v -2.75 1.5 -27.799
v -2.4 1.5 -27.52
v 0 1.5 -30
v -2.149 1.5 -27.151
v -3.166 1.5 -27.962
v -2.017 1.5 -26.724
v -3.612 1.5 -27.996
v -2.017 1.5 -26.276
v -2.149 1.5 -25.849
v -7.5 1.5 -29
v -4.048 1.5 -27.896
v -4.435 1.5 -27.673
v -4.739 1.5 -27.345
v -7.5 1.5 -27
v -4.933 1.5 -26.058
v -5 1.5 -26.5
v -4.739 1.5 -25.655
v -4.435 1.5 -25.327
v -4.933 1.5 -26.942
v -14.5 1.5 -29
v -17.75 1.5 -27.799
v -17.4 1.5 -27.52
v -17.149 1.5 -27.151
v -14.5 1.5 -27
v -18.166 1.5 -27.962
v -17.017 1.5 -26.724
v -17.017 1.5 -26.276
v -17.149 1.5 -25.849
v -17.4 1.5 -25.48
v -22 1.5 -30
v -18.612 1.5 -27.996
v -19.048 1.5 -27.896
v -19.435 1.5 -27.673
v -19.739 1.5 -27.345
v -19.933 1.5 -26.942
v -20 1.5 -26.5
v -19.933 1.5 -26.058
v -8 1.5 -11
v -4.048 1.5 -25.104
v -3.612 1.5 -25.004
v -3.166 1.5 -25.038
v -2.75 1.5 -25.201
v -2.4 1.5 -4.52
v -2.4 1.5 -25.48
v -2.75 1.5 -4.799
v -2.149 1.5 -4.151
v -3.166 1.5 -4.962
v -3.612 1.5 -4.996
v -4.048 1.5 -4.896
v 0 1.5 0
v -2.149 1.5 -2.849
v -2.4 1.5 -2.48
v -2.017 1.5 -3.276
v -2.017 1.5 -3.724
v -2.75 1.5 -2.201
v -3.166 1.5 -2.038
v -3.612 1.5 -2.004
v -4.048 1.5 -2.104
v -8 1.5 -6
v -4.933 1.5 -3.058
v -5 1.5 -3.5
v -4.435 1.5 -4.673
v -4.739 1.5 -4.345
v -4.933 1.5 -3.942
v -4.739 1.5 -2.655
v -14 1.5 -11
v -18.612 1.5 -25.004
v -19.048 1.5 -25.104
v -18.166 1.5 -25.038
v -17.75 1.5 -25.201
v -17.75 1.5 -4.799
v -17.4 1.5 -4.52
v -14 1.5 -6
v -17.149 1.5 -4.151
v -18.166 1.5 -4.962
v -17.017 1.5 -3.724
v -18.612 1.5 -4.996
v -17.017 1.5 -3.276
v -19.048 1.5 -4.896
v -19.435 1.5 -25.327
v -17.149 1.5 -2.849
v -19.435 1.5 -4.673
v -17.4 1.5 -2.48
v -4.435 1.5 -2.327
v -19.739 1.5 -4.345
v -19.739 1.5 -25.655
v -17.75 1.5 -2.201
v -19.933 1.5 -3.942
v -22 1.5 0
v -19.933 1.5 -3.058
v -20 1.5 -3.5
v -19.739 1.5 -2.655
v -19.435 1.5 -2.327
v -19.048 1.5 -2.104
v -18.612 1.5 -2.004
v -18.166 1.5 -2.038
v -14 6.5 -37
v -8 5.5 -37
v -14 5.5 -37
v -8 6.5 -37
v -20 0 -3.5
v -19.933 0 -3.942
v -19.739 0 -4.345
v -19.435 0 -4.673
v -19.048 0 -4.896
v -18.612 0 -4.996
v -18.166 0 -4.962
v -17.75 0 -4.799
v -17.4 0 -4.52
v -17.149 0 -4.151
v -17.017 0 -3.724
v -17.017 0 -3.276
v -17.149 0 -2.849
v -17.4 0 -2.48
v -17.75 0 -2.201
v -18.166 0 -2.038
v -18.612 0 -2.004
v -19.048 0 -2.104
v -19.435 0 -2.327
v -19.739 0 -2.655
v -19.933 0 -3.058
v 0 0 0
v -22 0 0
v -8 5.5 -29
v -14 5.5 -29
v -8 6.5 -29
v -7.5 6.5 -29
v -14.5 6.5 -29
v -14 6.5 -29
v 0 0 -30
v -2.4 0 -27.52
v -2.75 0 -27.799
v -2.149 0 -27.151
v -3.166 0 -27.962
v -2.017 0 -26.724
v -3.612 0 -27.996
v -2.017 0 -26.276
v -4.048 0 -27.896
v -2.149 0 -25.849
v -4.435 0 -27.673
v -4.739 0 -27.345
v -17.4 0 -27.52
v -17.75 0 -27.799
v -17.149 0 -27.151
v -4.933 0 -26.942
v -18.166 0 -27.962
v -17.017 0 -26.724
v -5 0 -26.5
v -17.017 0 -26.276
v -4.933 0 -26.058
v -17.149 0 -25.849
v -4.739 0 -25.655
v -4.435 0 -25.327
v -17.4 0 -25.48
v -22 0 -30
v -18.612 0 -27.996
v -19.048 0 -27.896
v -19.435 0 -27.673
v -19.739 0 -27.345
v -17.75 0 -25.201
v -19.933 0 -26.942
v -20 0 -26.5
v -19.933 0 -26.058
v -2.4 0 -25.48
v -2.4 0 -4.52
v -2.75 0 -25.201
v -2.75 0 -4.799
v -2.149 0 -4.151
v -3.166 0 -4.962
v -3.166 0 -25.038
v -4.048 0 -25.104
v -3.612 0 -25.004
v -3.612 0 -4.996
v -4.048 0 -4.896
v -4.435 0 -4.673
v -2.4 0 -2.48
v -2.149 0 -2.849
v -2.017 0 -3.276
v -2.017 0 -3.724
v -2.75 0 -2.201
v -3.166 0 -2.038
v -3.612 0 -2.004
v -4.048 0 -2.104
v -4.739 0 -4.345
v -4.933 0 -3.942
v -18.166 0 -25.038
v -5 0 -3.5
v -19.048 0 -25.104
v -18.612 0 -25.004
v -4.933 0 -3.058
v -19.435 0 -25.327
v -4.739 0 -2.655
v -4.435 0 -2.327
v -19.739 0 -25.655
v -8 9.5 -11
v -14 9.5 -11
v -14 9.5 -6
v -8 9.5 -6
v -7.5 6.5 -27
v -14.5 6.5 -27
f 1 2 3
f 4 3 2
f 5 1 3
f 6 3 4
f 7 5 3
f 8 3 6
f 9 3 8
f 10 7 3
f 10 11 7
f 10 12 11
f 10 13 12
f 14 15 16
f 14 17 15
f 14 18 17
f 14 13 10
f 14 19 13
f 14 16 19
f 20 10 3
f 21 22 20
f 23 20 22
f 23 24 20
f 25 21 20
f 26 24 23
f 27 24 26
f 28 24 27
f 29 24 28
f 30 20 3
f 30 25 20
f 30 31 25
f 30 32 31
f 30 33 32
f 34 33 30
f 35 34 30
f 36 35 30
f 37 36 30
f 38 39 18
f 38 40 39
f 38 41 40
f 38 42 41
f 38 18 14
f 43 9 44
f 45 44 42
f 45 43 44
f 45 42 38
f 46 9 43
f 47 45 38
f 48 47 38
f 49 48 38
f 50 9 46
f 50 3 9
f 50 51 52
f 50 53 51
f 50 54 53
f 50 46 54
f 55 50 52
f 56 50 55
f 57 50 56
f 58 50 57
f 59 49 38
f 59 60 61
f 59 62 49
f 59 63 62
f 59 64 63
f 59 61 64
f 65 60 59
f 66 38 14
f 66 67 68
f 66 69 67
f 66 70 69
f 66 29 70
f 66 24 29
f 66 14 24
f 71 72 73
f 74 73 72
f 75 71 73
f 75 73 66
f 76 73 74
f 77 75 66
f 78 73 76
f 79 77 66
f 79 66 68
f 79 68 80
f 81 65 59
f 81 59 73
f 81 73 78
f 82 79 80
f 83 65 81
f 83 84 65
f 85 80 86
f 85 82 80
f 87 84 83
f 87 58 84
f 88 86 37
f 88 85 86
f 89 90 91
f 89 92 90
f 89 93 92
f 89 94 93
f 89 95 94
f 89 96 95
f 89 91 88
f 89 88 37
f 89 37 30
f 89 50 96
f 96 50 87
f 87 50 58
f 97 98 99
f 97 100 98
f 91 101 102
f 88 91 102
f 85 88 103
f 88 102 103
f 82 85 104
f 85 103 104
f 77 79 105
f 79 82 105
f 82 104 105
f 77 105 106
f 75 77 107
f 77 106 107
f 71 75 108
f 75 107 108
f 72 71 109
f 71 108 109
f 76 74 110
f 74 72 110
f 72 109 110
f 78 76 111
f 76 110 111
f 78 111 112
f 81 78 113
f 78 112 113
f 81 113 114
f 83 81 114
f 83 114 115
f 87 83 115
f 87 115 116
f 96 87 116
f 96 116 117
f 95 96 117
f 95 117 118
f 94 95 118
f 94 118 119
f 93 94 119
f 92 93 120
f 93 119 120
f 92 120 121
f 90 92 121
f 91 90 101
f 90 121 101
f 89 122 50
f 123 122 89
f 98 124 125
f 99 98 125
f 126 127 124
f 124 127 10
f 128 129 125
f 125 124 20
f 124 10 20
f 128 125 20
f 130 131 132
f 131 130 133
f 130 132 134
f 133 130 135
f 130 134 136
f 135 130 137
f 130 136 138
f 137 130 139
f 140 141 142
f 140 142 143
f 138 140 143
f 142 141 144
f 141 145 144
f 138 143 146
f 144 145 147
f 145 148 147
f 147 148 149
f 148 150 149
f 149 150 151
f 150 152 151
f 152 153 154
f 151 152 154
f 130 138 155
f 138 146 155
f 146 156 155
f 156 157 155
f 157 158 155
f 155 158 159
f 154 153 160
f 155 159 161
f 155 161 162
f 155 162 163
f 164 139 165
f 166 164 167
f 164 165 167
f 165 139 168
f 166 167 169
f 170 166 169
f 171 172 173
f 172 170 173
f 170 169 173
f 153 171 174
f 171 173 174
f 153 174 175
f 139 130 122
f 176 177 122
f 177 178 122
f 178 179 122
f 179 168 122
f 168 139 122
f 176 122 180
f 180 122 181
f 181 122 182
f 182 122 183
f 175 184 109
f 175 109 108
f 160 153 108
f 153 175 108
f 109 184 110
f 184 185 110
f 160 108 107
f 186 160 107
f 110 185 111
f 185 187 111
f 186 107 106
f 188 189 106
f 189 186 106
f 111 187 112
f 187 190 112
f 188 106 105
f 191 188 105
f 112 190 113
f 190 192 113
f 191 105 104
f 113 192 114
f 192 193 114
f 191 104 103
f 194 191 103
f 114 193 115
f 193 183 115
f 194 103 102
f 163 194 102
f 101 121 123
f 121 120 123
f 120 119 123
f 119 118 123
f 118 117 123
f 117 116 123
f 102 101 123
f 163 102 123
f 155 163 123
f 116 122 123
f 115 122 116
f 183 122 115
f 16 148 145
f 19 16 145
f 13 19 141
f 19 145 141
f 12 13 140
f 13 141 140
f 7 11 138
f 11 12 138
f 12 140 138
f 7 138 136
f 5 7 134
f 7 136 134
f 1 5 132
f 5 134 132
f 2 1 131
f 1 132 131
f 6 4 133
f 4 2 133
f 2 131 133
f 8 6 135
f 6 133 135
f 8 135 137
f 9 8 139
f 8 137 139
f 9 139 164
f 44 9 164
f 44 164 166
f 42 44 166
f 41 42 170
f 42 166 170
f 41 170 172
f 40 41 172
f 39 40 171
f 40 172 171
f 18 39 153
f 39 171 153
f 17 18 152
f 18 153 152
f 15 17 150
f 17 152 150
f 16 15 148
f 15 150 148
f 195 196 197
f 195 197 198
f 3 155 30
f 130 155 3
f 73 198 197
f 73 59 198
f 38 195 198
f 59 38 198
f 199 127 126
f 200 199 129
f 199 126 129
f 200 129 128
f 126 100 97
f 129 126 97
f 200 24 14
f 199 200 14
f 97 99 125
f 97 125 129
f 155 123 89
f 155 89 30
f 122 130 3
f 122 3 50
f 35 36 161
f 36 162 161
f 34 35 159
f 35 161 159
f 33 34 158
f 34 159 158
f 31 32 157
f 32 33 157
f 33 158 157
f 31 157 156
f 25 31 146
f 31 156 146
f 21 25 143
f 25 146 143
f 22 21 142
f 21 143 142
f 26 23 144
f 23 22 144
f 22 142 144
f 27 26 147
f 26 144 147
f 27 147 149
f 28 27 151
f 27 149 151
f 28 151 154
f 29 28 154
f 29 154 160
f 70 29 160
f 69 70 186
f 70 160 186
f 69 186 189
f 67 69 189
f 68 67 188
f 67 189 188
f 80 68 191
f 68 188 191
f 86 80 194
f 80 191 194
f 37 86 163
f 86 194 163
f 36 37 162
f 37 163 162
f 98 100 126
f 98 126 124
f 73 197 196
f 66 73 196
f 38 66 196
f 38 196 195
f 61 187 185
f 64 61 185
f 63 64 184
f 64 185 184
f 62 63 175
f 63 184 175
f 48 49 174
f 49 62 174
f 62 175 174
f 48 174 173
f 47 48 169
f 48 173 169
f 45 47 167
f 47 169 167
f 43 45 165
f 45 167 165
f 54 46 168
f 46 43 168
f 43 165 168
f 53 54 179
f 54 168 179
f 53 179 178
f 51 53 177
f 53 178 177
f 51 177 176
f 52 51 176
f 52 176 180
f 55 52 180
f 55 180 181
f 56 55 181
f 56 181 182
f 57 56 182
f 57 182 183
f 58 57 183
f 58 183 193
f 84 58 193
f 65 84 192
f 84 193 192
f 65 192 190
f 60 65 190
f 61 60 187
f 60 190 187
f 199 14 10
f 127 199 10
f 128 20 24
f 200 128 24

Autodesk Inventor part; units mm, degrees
ref_plane "YZ Plane" through (0, 0, 0) normal (1, 0, 0) x (0, 1, 0)
ref_plane "XZ Plane" through (0, 0, 0) normal (0, 1, 0) x (-1, 0, 0)
ref_plane "XY Plane" through (0, 0, 0) normal (0, 0, 1) x (1, 0, 0)
sketch "Sketch1" plane through (0, 0, 0) normal (0, 1, 0) x (-1, 0, 0)
  line L0 (0, 0) -> (22, 0)
  line L1 (22, 0) -> (22, -30)
  line L2 (22, -30) -> (0, -30)
  line L3 (0, -30) -> (0, 0)
  circle A0 centre (18.5, -26.5) radius 1.5
  circle A1 centre (3.5, -26.5) radius 1.5
  circle A2 centre (3.5, -3.5) radius 1.5
  circle A3 centre (18.5, -3.5) radius 1.5
  line L4 (11, -30) -> (11, 0)
  line L5 (22, -15) -> (0, -15)
  dimension "d0" = 30
  dimension "d1" = 22
  dimension "d3" = 3
  dimension "d34" = 15
  dimension "d35" = 23
  dimension "d36" = 23
  dimension "d37" = 15
extrude "Extrusion1" add sketch "Sketch1" along normal blind 1.5
sketch "Sketch2" plane through (0, 1.5, 0) normal (0, 1, 0) x (1, 0, 0)
  line L0 (-14.5, 27) -> (-7.5, 27)
  line L1 (-7.5, 27) -> (-7.5, 29)
  line L2 (-7.5, 29) -> (-14.5, 29)
  line L3 (-14.5, 29) -> (-14.5, 27)
  line L4 (0, 30) -> (-22, 30) projected
  line L5 (-22, 0) -> (0, 0) projected
  line L6 (-11, 0) -> (-11, 30)
  line L7 (-8, 6) -> (-14, 6)
  line L8 (-14, 6) -> (-14, 11)
  line L9 (-14, 11) -> (-8, 11)
  line L10 (-8, 11) -> (-8, 6)
  dimension "d14" = 7
  dimension "d15" = 2
  dimension "d16" = 1
  dimension "d20" = 5
  dimension "d21" = 6
  dimension "d22" = 6
extrude "Extrusion2" add sketch "Sketch2" along normal blind 8
sketch "Sketch3" plane through (-7.5, 1.5, -29) normal (0, 0, -1) x (-1, 0, 0)
  line L0 (0.5, 4) -> (6.5, 4)
  line L1 (6.5, 4) -> (6.5, 5)
  line L2 (6.5, 5) -> (0.5, 5)
  line L3 (0.5, 5) -> (0.5, 4)
  line L4 (-7.5, 0) -> (14.5, 0) projected
  line L5 (0, 0) -> (0, 8) projected
  line L6 (7, 0) -> (7, 8) projected
  point P0 (-7.5, -1.5)
  dimension "d25" = 4
  dimension "d26" = 6
  dimension "d27" = 1
  dimension "d28" = 0.5
  dimension "d29" = 0.5
extrude "Extrusion3" add sketch "Sketch3" along normal blind 8
sketch "Sketch4" plane through (-7.5, 1.5, -29) normal (0, 0, -1) x (-1, 0, 0)
  line L0 (6.5, 5) -> (0.5, 5) projected
  line L1 (6.5, 4) -> (0.5, 4) projected
  line L2 (0.5, 4) -> (0.5, 5) projected
  line L3 (0.5, 5) -> (6.5, 5) projected
  line L4 (6.5, 5) -> (6.5, 4) projected
  line L5 (7, 0) -> (0, 0) projected
  line L6 (7, 0) -> (7, 8) projected
  line L7 (0, 8) -> (7, 8) projected
  line L8 (0, 0) -> (0, 8) projected
  line L9 (0, 5) -> (7, 5)
  point P0 (-7.5, -1.5)
extrude "Extrusion4" cut sketch "Sketch4" against normal blind 8 contours L0 L9 L8 L7 L6
properties part number "IR_Receiver"
